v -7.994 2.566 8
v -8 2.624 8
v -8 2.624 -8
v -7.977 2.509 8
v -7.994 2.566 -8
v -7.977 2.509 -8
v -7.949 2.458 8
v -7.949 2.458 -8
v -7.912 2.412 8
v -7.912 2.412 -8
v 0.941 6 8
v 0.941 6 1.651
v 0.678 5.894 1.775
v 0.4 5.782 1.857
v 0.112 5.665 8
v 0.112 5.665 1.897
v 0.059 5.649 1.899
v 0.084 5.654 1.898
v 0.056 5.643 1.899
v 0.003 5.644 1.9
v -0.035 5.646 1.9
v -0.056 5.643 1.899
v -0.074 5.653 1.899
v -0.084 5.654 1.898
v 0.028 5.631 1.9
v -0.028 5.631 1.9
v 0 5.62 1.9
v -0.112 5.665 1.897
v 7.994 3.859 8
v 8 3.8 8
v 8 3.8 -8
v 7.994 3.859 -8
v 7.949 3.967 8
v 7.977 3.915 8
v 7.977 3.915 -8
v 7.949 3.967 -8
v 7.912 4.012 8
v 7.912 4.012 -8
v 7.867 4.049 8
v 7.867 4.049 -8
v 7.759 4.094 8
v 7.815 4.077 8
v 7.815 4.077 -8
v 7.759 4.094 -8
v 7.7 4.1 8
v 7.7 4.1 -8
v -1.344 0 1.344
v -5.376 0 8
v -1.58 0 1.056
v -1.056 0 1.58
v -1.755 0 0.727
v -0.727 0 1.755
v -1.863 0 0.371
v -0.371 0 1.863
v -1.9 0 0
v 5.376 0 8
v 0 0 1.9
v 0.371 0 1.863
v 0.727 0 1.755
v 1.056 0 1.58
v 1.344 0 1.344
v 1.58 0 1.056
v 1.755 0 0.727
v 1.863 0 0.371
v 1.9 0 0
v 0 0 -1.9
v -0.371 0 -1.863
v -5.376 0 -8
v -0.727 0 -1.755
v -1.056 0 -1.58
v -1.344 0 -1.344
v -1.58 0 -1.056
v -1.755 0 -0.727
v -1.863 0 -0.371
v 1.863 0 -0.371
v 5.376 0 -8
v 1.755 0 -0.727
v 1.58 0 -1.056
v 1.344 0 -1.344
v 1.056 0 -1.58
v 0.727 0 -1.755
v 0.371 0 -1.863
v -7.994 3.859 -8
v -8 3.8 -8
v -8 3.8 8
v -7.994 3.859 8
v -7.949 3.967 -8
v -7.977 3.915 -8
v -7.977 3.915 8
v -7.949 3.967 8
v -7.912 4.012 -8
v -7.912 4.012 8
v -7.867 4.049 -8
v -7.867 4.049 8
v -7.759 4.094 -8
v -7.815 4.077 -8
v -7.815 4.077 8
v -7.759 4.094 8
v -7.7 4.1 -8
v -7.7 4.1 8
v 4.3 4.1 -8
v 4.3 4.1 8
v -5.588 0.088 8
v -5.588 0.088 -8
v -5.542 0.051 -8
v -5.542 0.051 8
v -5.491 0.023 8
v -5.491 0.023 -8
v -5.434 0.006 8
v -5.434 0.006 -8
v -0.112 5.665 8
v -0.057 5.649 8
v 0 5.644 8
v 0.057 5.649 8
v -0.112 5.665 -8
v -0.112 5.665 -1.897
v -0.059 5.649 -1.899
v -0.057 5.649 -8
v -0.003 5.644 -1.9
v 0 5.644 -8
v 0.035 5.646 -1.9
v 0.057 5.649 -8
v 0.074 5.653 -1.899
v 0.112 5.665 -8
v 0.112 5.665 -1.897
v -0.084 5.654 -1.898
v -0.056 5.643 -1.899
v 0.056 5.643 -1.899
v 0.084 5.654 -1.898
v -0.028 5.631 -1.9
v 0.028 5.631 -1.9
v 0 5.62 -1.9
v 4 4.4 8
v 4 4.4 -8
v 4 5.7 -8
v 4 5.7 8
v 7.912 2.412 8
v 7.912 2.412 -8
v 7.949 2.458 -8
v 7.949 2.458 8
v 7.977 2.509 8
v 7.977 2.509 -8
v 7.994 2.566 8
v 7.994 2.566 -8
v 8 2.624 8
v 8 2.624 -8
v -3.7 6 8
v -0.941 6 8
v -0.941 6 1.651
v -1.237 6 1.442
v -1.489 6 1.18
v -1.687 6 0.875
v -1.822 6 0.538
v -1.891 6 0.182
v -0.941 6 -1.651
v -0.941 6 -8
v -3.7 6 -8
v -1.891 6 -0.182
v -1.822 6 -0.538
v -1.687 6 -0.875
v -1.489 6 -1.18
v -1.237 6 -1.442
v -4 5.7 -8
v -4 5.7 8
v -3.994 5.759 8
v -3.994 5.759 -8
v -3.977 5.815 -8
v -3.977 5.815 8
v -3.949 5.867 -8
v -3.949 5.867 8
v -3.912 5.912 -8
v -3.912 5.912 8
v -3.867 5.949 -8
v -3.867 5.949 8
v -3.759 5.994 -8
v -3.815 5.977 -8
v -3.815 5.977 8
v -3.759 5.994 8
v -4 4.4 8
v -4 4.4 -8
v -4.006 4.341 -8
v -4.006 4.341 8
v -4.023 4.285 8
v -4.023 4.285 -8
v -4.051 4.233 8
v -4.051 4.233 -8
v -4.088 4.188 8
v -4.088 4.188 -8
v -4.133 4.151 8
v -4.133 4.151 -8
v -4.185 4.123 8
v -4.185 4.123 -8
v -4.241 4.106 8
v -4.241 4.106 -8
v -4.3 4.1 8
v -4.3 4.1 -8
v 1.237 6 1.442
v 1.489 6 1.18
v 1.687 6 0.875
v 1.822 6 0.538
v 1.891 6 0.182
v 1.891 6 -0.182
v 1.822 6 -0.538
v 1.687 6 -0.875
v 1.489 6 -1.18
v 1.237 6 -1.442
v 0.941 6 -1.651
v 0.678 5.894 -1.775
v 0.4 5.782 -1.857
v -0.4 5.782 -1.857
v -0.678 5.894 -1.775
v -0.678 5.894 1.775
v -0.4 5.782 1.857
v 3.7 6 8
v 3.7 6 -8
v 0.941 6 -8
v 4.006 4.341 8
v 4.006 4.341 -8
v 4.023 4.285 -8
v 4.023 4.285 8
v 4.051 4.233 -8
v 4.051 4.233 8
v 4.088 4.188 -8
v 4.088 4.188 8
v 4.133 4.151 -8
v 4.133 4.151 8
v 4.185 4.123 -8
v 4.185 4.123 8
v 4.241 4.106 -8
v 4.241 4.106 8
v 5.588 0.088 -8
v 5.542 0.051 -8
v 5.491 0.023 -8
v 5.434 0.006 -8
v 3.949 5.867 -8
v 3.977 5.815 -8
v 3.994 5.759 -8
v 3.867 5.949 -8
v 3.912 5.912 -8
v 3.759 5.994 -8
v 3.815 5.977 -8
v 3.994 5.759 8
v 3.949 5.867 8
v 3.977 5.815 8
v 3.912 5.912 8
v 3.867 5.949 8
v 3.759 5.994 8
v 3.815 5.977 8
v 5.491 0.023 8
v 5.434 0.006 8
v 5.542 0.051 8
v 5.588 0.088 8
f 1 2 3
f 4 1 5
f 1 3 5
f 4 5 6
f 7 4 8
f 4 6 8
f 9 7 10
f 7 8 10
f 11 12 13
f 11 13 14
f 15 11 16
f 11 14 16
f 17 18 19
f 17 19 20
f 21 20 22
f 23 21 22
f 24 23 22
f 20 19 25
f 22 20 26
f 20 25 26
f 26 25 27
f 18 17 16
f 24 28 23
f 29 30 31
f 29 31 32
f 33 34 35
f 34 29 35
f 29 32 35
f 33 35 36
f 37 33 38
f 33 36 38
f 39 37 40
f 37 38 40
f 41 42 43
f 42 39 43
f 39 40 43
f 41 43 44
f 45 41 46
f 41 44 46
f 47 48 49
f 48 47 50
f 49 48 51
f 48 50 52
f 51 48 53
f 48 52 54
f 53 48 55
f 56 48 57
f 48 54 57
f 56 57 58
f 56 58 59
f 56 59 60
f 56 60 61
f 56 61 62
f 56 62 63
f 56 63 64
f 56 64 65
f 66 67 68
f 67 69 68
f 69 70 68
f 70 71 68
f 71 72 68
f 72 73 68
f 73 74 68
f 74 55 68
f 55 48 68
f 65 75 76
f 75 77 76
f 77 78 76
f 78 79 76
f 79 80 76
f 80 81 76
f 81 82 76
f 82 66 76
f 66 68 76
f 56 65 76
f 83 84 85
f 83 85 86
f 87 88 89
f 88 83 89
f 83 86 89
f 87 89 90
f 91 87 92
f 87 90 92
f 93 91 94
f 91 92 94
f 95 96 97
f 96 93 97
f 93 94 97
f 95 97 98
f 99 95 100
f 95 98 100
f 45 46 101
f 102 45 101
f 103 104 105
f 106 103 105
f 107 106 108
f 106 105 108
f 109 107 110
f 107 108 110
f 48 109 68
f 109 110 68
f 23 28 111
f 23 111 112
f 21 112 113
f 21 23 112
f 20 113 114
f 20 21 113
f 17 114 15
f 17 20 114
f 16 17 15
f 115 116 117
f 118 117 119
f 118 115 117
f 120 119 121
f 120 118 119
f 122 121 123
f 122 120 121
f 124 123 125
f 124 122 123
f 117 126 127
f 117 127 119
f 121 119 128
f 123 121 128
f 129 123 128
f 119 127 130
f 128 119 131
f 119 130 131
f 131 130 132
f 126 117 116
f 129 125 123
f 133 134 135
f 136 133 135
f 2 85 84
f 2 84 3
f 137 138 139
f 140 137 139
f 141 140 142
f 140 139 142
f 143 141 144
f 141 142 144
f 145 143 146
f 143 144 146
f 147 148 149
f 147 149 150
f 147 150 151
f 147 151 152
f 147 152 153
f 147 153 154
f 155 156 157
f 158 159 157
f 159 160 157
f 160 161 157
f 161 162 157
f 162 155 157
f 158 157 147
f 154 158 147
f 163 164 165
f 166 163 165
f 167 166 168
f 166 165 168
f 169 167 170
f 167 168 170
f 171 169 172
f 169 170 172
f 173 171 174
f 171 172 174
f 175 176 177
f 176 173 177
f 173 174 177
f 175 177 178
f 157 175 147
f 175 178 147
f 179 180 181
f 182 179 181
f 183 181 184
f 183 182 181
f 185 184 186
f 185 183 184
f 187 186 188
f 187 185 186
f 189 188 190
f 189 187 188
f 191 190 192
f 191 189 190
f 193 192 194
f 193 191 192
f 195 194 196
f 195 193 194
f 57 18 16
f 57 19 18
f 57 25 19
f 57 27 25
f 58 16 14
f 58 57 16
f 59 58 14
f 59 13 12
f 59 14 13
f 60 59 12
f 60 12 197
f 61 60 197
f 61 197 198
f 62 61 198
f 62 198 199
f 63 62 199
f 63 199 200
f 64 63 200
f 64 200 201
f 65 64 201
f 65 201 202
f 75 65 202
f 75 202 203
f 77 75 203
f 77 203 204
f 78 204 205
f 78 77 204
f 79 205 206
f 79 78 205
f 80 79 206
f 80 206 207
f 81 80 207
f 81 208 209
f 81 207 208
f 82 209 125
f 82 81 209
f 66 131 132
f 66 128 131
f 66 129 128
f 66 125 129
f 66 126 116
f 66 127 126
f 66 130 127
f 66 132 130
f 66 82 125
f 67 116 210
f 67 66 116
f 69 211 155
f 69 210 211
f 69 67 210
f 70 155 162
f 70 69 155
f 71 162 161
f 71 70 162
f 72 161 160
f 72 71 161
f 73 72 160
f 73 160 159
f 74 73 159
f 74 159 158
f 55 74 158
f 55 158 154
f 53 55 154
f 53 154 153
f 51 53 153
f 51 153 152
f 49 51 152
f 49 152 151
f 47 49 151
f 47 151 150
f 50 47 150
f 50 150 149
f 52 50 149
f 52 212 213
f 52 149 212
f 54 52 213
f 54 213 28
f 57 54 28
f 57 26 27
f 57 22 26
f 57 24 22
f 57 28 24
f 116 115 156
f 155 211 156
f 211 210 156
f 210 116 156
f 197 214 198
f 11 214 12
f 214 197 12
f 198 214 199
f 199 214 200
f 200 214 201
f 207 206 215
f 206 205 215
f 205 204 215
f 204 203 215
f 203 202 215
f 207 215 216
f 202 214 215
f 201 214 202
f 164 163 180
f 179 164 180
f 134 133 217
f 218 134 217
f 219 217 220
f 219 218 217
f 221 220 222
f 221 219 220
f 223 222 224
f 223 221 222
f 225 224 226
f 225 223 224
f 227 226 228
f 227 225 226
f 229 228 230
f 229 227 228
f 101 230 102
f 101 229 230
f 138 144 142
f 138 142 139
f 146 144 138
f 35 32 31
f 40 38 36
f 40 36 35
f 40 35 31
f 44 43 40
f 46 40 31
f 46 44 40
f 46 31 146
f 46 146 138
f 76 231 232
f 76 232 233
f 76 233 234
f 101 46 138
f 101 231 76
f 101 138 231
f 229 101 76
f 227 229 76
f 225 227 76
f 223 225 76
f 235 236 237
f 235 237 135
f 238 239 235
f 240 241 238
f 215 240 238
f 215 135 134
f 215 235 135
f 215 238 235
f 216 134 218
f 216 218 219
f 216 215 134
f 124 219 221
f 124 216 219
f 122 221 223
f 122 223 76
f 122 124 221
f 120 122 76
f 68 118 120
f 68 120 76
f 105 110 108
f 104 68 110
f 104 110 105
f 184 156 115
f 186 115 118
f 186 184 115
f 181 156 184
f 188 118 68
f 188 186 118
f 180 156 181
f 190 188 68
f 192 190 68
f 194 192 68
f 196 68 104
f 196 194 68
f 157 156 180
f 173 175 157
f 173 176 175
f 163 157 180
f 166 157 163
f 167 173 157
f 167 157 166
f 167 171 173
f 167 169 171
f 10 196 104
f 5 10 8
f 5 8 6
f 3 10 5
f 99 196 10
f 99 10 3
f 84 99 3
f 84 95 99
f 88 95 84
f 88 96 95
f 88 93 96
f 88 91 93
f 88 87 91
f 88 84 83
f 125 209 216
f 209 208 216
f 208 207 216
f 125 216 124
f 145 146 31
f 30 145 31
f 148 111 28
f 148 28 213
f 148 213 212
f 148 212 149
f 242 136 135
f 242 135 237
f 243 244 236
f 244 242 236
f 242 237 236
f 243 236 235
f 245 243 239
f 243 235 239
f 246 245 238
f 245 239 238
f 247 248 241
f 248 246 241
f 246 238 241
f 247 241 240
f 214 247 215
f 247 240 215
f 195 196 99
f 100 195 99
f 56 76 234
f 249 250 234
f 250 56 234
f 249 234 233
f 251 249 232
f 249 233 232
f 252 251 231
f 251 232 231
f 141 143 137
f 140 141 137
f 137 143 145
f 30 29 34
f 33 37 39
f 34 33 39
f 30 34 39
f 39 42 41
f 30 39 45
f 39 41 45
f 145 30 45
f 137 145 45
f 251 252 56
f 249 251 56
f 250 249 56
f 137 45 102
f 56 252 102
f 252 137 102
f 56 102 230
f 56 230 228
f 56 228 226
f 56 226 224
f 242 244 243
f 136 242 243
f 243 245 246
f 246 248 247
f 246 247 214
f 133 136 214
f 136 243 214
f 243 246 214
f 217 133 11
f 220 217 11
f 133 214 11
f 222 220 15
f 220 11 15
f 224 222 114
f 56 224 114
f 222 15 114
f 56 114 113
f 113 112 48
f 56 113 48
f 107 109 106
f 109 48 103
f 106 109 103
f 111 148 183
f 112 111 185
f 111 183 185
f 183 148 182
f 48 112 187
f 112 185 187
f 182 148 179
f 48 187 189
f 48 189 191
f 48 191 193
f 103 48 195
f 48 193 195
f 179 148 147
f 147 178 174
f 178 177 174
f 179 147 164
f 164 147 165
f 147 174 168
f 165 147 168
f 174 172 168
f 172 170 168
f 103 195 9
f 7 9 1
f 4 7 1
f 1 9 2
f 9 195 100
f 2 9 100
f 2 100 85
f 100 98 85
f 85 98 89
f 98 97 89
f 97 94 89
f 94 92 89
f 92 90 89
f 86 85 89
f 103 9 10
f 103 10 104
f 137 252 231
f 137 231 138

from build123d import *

# Parameters (mm, degrees)
BOSS_EXTRUDE1_DEPTH      = 8
BOSS_EXTRUDE1_DEPTH_BACK = 8
SKETCH9_R                = 1.9
CUT_EXTRUDE2_DEPTH       = 13.806248475
FILLET1_R                = 0.3


with BuildPart() as part:
    # Sketch4 → Boss-Extrude1 (new, two sides: drawn at the far end of the back side and taken through both)
    with BuildSketch(Plane.XY.offset(-BOSS_EXTRUDE1_DEPTH_BACK)):
        Polygon((-8, 4.1), (-8, 2.5), (-5.5, 0), (5.5, 0), (8, 2.5), (8, 4.1), (4, 4.1), (4, 6), (0.940533004, 6), (0, 5.62), (-0.940533004, 6), (-4, 6), (-4, 4.1), align=None)
    extrude(amount=BOSS_EXTRUDE1_DEPTH + BOSS_EXTRUDE1_DEPTH_BACK)

    # Sketch9 → Cut-Extrude2 (cut, through all)
    with BuildSketch(Plane(origin=(0, 0, 0), x_dir=(1, 0, 0), z_dir=(0, 1, 0))):
        with Locations(Location((0, 0, 0), (0, 0, 270))):
            Circle(SKETCH9_R)
    extrude(amount=CUT_EXTRUDE2_DEPTH, mode=Mode.SUBTRACT)

    # Fillet1
    # the kernel refuses this fillet: 0.3 mm, written as the material it adds along each edge
    with BuildSketch(Plane(origin=(-4, 4.1, 8), x_dir=(-1, 0, 0), z_dir=(0, 0, -1)), Plane(origin=(4, 4.1, -8), x_dir=(1, 0, 0), z_dir=(0, 0, 1))) as fillet1_piece_1:
        with BuildLine():
            CenterArc((FILLET1_R, FILLET1_R), FILLET1_R, 180, 90)
            Line((0, FILLET1_R), (0, 0))
            Line((0, 0), (FILLET1_R, 0))
        make_face()
    extrude(amount=16)
    with BuildSketch(Plane(origin=(0, 5.62, -8), x_dir=(0.927183854566788, 0.3746065934159107, 0), z_dir=(0, 0, 1))) as fillet1_piece_2_section:
        with BuildLine():
            CenterArc((FILLET1_R * 0.404026225835, FILLET1_R), FILLET1_R, 226, 44)
            Line((-FILLET1_R * 0.290632144624, FILLET1_R * 0.280660199661), (0, 0))
            Line((0, 0), (FILLET1_R * 0.404026225835, 0))
        make_face()
    fillet1_piece_2 = extrude(amount=6.403019669, mode=Mode.PRIVATE)
    fillet1_piece_2 = fillet1_piece_2 - Plane(origin=(0, 5.639105269, 0), x_dir=(0, 0, 1), z_dir=(0, -1, 0)) * Cylinder(1.9, 14, mode=Mode.PRIVATE)
    add(fillet1_piece_2)
    with BuildSketch(Plane(origin=(0, 5.62, 1.596980331), x_dir=(0.927183854566788, 0.3746065934159107, 0), z_dir=(0, 0, 1))) as fillet1_piece_3_section:
        with BuildLine():
            CenterArc((FILLET1_R * 0.404026225835, FILLET1_R), FILLET1_R, 226, 44)
            Line((-FILLET1_R * 0.290632144624, FILLET1_R * 0.280660199661), (0, 0))
            Line((0, 0), (FILLET1_R * 0.404026225835, 0))
        make_face()
    fillet1_piece_3 = extrude(amount=6.403019669, mode=Mode.PRIVATE)
    fillet1_piece_3 = fillet1_piece_3 - Plane(origin=(0, 5.639105269, 0), x_dir=(0, 0, 1), z_dir=(0, -1, 0)) * Cylinder(1.9, 14, mode=Mode.PRIVATE)
    add(fillet1_piece_3)
    # the kernel refuses this fillet: 0.3 mm, written as the material it takes off along each edge
    with BuildSketch(Plane(origin=(-4, 6, 8.75), x_dir=(1, 0, 0), z_dir=(0, 0, -1))) as fillet1_2_piece_1:
        with BuildLine():
            CenterArc((FILLET1_R, FILLET1_R), FILLET1_R, 180, 90)
            Line((0, FILLET1_R), (0, 0))
            Line((0, 0), (FILLET1_R, 0))
        make_face()
    extrude(amount=17.5, mode=Mode.SUBTRACT)
    with BuildSketch(Plane(origin=(-8, 4.1, 8.75), x_dir=(0, -1, 0), z_dir=(0, 0, -1)), Plane(origin=(8, 4.1, -8.75), x_dir=(0, -1, 0), z_dir=(0, 0, 1)), Plane(origin=(4, 6, -8.75), x_dir=(0, -1, 0), z_dir=(0, 0, 1))) as fillet1_2_piece_2:
        with BuildLine():
            CenterArc((FILLET1_R, -FILLET1_R), FILLET1_R, 90, 90)
            Line((0, -FILLET1_R), (0, 0))
            Line((0, 0), (FILLET1_R, 0))
        make_face()
    extrude(amount=17.5, mode=Mode.SUBTRACT)
    with BuildSketch(Plane(origin=(-8, 2.5, -8.310660172), x_dir=(0, 1, 0), z_dir=(0, 0, 1)), Plane(origin=(-5.5, 0, -8.310660172), x_dir=(-0.7071067811865439, 0.7071067811865512, 0), z_dir=(0, 0, 1)), Plane(origin=(5.5, 0, -8.310660172), x_dir=(-1, 0, 0), z_dir=(0, 0, 1)), Plane(origin=(8, 2.5, -8.310660172), x_dir=(-0.7071067811865492, -0.7071067811865457, 0), z_dir=(0, 0, 1))) as fillet1_2_piece_3:
        with BuildLine():
            CenterArc((FILLET1_R * 0.414213562373, -FILLET1_R), FILLET1_R, 90, 45)
            Line((-FILLET1_R * 0.292893218813, -FILLET1_R * 0.292893218813), (0, 0))
            Line((0, 0), (FILLET1_R * 0.414213562373, 0))
        make_face()
    extrude(amount=16.621320344, mode=Mode.SUBTRACT)


solid = part.part
